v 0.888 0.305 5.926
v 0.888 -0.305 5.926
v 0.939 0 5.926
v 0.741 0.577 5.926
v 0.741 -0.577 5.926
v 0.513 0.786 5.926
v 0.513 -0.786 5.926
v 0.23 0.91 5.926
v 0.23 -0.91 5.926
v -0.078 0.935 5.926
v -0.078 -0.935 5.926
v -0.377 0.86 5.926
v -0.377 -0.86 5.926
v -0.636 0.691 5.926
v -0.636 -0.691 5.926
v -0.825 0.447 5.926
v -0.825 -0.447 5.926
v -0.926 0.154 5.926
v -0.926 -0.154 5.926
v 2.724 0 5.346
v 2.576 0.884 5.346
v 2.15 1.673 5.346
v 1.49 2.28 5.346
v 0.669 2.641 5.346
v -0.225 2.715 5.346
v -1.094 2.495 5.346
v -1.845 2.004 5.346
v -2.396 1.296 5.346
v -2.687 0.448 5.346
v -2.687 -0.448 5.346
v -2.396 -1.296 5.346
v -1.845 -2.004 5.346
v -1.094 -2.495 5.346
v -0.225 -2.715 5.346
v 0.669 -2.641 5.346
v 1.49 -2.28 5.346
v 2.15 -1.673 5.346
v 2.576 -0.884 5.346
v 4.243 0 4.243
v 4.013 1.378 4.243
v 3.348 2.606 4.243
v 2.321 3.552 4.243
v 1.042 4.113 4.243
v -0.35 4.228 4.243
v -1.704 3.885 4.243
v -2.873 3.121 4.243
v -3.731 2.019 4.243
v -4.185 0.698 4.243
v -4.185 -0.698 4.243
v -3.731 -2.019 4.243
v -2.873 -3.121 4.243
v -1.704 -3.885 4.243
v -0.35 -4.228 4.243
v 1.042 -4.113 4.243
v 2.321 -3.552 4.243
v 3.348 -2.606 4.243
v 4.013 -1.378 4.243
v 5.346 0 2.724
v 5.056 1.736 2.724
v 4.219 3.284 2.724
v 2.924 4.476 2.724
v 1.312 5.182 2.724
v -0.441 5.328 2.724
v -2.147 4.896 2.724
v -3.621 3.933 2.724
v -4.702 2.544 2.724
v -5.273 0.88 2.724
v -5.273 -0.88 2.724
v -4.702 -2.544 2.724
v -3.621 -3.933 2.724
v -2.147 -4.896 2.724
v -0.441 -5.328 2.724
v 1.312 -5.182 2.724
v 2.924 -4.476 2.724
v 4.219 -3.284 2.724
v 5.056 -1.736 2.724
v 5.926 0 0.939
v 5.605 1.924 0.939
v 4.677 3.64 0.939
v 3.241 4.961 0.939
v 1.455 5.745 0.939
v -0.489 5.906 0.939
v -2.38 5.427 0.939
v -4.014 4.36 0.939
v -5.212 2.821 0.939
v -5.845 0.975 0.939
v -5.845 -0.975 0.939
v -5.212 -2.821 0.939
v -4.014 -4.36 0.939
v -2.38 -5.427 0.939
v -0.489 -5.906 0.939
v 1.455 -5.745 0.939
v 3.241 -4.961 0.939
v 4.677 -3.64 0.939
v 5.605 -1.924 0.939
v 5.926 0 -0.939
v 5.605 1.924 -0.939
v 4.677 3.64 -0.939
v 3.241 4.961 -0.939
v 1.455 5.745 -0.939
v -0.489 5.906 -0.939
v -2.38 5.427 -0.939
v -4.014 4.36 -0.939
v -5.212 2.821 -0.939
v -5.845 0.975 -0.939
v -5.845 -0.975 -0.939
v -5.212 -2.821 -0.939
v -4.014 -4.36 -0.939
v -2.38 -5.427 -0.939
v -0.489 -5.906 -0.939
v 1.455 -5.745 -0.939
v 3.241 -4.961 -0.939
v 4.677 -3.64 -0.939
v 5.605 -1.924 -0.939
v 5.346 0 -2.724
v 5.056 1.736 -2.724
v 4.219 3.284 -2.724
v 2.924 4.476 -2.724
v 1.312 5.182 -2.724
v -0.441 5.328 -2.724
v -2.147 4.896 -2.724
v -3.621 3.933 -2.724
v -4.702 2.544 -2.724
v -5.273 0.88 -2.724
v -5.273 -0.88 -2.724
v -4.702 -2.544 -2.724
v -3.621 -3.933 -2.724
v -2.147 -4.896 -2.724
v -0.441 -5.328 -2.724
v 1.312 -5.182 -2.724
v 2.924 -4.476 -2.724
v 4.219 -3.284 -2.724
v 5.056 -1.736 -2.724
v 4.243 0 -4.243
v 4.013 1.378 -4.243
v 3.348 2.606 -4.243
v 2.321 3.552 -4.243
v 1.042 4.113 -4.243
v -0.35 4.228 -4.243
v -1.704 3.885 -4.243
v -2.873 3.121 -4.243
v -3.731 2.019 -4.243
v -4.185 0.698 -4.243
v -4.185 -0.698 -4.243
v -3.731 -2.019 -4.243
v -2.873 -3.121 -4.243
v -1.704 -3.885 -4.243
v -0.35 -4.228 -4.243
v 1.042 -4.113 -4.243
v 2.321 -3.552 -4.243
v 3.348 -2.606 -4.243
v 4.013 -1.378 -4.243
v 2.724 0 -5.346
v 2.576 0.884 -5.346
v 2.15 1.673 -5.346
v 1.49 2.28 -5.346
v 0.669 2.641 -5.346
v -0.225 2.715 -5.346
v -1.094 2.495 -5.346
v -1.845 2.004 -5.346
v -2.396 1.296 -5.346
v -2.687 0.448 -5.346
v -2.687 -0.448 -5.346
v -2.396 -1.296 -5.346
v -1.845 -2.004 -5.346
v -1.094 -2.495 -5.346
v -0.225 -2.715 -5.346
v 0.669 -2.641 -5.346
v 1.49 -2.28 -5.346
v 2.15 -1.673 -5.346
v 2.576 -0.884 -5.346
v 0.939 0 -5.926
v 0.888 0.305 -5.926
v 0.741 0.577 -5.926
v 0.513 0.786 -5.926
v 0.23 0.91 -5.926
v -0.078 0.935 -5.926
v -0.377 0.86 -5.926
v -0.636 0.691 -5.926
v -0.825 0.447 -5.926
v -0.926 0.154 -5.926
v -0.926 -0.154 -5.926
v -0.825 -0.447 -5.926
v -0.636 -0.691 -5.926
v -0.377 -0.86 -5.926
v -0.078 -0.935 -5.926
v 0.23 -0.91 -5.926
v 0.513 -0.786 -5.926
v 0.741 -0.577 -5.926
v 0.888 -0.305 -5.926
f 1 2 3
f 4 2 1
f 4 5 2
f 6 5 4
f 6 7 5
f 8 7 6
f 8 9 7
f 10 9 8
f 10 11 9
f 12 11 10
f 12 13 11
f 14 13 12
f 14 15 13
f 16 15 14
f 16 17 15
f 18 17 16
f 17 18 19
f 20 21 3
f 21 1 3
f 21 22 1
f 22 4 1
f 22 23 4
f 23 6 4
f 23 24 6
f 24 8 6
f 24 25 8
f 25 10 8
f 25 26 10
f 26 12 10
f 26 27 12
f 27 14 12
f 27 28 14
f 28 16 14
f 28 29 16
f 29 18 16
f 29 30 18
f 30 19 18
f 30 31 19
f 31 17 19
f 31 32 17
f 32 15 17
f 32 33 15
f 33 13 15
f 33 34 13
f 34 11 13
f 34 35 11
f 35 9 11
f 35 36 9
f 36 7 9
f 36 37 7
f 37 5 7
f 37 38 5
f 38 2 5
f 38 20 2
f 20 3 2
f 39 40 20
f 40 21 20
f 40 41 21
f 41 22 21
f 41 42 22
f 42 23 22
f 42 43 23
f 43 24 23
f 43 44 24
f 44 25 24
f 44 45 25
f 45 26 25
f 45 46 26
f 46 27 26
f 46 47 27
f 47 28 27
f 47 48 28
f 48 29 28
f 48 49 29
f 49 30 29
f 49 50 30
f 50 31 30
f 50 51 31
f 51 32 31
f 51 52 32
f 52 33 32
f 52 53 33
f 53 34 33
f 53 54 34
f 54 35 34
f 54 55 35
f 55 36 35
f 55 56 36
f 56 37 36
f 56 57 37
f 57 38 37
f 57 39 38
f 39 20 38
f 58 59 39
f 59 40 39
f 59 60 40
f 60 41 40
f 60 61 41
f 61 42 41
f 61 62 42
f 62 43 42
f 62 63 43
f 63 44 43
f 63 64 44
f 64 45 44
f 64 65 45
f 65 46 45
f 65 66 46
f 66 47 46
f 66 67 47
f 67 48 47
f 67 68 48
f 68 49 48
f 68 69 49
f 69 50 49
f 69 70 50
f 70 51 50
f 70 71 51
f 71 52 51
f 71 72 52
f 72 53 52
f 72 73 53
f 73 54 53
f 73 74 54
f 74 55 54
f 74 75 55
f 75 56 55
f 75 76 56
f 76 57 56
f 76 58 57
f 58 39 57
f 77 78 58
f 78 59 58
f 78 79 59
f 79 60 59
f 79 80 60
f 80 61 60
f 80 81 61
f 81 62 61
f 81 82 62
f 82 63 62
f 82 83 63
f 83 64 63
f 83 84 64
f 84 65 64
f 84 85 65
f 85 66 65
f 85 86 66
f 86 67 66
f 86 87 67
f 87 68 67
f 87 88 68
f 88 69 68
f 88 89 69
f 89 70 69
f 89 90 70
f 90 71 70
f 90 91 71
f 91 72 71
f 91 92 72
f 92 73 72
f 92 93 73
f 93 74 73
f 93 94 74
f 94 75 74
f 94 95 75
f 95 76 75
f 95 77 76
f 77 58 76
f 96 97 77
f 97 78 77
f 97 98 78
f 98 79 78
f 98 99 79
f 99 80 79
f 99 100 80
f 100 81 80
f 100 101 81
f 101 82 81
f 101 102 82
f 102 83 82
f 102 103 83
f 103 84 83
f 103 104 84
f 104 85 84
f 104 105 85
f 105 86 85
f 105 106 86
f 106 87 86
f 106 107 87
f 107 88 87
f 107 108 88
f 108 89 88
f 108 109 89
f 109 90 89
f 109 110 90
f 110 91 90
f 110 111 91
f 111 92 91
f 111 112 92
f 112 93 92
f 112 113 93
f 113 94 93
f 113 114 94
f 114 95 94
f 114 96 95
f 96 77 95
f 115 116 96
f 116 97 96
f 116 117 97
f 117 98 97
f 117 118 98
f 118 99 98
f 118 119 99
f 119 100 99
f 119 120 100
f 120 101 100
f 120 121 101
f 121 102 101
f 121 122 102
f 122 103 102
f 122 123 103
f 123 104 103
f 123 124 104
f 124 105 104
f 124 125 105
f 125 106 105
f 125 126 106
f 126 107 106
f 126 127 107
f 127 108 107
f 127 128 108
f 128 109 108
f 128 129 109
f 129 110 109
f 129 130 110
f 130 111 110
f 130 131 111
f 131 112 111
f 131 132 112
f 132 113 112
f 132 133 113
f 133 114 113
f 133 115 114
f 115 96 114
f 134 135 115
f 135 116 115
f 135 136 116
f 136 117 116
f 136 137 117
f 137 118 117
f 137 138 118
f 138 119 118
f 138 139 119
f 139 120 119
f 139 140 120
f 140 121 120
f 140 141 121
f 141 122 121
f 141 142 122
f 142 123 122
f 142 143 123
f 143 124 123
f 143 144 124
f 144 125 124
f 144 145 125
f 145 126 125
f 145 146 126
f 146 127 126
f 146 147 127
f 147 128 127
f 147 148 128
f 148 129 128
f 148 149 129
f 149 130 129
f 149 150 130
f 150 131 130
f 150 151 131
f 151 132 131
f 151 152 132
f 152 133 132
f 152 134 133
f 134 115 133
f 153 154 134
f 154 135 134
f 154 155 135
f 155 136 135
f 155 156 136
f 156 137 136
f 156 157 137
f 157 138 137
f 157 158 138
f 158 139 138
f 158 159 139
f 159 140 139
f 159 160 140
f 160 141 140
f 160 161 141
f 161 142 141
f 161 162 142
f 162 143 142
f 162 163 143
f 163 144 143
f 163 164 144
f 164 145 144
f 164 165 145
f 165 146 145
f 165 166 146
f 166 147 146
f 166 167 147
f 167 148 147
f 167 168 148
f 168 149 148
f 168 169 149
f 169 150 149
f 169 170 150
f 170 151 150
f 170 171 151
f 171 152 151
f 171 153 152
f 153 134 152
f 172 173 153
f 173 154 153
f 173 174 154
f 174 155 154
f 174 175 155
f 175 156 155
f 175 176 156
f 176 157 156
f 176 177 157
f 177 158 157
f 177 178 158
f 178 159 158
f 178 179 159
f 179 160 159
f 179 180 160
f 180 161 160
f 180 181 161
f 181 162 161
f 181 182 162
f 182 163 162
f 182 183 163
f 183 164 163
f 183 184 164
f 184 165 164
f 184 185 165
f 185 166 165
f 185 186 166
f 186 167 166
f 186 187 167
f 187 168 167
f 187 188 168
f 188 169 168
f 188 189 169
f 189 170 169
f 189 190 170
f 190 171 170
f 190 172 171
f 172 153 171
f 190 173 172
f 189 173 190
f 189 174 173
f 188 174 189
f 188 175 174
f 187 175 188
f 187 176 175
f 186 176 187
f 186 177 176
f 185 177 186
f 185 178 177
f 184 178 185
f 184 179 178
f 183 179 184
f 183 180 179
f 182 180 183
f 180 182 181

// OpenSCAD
// Let's create a Sphere with 6mm radius
// Radius is half the diameter
// The diameter is therefore 12mm
sphere(r = 6);
